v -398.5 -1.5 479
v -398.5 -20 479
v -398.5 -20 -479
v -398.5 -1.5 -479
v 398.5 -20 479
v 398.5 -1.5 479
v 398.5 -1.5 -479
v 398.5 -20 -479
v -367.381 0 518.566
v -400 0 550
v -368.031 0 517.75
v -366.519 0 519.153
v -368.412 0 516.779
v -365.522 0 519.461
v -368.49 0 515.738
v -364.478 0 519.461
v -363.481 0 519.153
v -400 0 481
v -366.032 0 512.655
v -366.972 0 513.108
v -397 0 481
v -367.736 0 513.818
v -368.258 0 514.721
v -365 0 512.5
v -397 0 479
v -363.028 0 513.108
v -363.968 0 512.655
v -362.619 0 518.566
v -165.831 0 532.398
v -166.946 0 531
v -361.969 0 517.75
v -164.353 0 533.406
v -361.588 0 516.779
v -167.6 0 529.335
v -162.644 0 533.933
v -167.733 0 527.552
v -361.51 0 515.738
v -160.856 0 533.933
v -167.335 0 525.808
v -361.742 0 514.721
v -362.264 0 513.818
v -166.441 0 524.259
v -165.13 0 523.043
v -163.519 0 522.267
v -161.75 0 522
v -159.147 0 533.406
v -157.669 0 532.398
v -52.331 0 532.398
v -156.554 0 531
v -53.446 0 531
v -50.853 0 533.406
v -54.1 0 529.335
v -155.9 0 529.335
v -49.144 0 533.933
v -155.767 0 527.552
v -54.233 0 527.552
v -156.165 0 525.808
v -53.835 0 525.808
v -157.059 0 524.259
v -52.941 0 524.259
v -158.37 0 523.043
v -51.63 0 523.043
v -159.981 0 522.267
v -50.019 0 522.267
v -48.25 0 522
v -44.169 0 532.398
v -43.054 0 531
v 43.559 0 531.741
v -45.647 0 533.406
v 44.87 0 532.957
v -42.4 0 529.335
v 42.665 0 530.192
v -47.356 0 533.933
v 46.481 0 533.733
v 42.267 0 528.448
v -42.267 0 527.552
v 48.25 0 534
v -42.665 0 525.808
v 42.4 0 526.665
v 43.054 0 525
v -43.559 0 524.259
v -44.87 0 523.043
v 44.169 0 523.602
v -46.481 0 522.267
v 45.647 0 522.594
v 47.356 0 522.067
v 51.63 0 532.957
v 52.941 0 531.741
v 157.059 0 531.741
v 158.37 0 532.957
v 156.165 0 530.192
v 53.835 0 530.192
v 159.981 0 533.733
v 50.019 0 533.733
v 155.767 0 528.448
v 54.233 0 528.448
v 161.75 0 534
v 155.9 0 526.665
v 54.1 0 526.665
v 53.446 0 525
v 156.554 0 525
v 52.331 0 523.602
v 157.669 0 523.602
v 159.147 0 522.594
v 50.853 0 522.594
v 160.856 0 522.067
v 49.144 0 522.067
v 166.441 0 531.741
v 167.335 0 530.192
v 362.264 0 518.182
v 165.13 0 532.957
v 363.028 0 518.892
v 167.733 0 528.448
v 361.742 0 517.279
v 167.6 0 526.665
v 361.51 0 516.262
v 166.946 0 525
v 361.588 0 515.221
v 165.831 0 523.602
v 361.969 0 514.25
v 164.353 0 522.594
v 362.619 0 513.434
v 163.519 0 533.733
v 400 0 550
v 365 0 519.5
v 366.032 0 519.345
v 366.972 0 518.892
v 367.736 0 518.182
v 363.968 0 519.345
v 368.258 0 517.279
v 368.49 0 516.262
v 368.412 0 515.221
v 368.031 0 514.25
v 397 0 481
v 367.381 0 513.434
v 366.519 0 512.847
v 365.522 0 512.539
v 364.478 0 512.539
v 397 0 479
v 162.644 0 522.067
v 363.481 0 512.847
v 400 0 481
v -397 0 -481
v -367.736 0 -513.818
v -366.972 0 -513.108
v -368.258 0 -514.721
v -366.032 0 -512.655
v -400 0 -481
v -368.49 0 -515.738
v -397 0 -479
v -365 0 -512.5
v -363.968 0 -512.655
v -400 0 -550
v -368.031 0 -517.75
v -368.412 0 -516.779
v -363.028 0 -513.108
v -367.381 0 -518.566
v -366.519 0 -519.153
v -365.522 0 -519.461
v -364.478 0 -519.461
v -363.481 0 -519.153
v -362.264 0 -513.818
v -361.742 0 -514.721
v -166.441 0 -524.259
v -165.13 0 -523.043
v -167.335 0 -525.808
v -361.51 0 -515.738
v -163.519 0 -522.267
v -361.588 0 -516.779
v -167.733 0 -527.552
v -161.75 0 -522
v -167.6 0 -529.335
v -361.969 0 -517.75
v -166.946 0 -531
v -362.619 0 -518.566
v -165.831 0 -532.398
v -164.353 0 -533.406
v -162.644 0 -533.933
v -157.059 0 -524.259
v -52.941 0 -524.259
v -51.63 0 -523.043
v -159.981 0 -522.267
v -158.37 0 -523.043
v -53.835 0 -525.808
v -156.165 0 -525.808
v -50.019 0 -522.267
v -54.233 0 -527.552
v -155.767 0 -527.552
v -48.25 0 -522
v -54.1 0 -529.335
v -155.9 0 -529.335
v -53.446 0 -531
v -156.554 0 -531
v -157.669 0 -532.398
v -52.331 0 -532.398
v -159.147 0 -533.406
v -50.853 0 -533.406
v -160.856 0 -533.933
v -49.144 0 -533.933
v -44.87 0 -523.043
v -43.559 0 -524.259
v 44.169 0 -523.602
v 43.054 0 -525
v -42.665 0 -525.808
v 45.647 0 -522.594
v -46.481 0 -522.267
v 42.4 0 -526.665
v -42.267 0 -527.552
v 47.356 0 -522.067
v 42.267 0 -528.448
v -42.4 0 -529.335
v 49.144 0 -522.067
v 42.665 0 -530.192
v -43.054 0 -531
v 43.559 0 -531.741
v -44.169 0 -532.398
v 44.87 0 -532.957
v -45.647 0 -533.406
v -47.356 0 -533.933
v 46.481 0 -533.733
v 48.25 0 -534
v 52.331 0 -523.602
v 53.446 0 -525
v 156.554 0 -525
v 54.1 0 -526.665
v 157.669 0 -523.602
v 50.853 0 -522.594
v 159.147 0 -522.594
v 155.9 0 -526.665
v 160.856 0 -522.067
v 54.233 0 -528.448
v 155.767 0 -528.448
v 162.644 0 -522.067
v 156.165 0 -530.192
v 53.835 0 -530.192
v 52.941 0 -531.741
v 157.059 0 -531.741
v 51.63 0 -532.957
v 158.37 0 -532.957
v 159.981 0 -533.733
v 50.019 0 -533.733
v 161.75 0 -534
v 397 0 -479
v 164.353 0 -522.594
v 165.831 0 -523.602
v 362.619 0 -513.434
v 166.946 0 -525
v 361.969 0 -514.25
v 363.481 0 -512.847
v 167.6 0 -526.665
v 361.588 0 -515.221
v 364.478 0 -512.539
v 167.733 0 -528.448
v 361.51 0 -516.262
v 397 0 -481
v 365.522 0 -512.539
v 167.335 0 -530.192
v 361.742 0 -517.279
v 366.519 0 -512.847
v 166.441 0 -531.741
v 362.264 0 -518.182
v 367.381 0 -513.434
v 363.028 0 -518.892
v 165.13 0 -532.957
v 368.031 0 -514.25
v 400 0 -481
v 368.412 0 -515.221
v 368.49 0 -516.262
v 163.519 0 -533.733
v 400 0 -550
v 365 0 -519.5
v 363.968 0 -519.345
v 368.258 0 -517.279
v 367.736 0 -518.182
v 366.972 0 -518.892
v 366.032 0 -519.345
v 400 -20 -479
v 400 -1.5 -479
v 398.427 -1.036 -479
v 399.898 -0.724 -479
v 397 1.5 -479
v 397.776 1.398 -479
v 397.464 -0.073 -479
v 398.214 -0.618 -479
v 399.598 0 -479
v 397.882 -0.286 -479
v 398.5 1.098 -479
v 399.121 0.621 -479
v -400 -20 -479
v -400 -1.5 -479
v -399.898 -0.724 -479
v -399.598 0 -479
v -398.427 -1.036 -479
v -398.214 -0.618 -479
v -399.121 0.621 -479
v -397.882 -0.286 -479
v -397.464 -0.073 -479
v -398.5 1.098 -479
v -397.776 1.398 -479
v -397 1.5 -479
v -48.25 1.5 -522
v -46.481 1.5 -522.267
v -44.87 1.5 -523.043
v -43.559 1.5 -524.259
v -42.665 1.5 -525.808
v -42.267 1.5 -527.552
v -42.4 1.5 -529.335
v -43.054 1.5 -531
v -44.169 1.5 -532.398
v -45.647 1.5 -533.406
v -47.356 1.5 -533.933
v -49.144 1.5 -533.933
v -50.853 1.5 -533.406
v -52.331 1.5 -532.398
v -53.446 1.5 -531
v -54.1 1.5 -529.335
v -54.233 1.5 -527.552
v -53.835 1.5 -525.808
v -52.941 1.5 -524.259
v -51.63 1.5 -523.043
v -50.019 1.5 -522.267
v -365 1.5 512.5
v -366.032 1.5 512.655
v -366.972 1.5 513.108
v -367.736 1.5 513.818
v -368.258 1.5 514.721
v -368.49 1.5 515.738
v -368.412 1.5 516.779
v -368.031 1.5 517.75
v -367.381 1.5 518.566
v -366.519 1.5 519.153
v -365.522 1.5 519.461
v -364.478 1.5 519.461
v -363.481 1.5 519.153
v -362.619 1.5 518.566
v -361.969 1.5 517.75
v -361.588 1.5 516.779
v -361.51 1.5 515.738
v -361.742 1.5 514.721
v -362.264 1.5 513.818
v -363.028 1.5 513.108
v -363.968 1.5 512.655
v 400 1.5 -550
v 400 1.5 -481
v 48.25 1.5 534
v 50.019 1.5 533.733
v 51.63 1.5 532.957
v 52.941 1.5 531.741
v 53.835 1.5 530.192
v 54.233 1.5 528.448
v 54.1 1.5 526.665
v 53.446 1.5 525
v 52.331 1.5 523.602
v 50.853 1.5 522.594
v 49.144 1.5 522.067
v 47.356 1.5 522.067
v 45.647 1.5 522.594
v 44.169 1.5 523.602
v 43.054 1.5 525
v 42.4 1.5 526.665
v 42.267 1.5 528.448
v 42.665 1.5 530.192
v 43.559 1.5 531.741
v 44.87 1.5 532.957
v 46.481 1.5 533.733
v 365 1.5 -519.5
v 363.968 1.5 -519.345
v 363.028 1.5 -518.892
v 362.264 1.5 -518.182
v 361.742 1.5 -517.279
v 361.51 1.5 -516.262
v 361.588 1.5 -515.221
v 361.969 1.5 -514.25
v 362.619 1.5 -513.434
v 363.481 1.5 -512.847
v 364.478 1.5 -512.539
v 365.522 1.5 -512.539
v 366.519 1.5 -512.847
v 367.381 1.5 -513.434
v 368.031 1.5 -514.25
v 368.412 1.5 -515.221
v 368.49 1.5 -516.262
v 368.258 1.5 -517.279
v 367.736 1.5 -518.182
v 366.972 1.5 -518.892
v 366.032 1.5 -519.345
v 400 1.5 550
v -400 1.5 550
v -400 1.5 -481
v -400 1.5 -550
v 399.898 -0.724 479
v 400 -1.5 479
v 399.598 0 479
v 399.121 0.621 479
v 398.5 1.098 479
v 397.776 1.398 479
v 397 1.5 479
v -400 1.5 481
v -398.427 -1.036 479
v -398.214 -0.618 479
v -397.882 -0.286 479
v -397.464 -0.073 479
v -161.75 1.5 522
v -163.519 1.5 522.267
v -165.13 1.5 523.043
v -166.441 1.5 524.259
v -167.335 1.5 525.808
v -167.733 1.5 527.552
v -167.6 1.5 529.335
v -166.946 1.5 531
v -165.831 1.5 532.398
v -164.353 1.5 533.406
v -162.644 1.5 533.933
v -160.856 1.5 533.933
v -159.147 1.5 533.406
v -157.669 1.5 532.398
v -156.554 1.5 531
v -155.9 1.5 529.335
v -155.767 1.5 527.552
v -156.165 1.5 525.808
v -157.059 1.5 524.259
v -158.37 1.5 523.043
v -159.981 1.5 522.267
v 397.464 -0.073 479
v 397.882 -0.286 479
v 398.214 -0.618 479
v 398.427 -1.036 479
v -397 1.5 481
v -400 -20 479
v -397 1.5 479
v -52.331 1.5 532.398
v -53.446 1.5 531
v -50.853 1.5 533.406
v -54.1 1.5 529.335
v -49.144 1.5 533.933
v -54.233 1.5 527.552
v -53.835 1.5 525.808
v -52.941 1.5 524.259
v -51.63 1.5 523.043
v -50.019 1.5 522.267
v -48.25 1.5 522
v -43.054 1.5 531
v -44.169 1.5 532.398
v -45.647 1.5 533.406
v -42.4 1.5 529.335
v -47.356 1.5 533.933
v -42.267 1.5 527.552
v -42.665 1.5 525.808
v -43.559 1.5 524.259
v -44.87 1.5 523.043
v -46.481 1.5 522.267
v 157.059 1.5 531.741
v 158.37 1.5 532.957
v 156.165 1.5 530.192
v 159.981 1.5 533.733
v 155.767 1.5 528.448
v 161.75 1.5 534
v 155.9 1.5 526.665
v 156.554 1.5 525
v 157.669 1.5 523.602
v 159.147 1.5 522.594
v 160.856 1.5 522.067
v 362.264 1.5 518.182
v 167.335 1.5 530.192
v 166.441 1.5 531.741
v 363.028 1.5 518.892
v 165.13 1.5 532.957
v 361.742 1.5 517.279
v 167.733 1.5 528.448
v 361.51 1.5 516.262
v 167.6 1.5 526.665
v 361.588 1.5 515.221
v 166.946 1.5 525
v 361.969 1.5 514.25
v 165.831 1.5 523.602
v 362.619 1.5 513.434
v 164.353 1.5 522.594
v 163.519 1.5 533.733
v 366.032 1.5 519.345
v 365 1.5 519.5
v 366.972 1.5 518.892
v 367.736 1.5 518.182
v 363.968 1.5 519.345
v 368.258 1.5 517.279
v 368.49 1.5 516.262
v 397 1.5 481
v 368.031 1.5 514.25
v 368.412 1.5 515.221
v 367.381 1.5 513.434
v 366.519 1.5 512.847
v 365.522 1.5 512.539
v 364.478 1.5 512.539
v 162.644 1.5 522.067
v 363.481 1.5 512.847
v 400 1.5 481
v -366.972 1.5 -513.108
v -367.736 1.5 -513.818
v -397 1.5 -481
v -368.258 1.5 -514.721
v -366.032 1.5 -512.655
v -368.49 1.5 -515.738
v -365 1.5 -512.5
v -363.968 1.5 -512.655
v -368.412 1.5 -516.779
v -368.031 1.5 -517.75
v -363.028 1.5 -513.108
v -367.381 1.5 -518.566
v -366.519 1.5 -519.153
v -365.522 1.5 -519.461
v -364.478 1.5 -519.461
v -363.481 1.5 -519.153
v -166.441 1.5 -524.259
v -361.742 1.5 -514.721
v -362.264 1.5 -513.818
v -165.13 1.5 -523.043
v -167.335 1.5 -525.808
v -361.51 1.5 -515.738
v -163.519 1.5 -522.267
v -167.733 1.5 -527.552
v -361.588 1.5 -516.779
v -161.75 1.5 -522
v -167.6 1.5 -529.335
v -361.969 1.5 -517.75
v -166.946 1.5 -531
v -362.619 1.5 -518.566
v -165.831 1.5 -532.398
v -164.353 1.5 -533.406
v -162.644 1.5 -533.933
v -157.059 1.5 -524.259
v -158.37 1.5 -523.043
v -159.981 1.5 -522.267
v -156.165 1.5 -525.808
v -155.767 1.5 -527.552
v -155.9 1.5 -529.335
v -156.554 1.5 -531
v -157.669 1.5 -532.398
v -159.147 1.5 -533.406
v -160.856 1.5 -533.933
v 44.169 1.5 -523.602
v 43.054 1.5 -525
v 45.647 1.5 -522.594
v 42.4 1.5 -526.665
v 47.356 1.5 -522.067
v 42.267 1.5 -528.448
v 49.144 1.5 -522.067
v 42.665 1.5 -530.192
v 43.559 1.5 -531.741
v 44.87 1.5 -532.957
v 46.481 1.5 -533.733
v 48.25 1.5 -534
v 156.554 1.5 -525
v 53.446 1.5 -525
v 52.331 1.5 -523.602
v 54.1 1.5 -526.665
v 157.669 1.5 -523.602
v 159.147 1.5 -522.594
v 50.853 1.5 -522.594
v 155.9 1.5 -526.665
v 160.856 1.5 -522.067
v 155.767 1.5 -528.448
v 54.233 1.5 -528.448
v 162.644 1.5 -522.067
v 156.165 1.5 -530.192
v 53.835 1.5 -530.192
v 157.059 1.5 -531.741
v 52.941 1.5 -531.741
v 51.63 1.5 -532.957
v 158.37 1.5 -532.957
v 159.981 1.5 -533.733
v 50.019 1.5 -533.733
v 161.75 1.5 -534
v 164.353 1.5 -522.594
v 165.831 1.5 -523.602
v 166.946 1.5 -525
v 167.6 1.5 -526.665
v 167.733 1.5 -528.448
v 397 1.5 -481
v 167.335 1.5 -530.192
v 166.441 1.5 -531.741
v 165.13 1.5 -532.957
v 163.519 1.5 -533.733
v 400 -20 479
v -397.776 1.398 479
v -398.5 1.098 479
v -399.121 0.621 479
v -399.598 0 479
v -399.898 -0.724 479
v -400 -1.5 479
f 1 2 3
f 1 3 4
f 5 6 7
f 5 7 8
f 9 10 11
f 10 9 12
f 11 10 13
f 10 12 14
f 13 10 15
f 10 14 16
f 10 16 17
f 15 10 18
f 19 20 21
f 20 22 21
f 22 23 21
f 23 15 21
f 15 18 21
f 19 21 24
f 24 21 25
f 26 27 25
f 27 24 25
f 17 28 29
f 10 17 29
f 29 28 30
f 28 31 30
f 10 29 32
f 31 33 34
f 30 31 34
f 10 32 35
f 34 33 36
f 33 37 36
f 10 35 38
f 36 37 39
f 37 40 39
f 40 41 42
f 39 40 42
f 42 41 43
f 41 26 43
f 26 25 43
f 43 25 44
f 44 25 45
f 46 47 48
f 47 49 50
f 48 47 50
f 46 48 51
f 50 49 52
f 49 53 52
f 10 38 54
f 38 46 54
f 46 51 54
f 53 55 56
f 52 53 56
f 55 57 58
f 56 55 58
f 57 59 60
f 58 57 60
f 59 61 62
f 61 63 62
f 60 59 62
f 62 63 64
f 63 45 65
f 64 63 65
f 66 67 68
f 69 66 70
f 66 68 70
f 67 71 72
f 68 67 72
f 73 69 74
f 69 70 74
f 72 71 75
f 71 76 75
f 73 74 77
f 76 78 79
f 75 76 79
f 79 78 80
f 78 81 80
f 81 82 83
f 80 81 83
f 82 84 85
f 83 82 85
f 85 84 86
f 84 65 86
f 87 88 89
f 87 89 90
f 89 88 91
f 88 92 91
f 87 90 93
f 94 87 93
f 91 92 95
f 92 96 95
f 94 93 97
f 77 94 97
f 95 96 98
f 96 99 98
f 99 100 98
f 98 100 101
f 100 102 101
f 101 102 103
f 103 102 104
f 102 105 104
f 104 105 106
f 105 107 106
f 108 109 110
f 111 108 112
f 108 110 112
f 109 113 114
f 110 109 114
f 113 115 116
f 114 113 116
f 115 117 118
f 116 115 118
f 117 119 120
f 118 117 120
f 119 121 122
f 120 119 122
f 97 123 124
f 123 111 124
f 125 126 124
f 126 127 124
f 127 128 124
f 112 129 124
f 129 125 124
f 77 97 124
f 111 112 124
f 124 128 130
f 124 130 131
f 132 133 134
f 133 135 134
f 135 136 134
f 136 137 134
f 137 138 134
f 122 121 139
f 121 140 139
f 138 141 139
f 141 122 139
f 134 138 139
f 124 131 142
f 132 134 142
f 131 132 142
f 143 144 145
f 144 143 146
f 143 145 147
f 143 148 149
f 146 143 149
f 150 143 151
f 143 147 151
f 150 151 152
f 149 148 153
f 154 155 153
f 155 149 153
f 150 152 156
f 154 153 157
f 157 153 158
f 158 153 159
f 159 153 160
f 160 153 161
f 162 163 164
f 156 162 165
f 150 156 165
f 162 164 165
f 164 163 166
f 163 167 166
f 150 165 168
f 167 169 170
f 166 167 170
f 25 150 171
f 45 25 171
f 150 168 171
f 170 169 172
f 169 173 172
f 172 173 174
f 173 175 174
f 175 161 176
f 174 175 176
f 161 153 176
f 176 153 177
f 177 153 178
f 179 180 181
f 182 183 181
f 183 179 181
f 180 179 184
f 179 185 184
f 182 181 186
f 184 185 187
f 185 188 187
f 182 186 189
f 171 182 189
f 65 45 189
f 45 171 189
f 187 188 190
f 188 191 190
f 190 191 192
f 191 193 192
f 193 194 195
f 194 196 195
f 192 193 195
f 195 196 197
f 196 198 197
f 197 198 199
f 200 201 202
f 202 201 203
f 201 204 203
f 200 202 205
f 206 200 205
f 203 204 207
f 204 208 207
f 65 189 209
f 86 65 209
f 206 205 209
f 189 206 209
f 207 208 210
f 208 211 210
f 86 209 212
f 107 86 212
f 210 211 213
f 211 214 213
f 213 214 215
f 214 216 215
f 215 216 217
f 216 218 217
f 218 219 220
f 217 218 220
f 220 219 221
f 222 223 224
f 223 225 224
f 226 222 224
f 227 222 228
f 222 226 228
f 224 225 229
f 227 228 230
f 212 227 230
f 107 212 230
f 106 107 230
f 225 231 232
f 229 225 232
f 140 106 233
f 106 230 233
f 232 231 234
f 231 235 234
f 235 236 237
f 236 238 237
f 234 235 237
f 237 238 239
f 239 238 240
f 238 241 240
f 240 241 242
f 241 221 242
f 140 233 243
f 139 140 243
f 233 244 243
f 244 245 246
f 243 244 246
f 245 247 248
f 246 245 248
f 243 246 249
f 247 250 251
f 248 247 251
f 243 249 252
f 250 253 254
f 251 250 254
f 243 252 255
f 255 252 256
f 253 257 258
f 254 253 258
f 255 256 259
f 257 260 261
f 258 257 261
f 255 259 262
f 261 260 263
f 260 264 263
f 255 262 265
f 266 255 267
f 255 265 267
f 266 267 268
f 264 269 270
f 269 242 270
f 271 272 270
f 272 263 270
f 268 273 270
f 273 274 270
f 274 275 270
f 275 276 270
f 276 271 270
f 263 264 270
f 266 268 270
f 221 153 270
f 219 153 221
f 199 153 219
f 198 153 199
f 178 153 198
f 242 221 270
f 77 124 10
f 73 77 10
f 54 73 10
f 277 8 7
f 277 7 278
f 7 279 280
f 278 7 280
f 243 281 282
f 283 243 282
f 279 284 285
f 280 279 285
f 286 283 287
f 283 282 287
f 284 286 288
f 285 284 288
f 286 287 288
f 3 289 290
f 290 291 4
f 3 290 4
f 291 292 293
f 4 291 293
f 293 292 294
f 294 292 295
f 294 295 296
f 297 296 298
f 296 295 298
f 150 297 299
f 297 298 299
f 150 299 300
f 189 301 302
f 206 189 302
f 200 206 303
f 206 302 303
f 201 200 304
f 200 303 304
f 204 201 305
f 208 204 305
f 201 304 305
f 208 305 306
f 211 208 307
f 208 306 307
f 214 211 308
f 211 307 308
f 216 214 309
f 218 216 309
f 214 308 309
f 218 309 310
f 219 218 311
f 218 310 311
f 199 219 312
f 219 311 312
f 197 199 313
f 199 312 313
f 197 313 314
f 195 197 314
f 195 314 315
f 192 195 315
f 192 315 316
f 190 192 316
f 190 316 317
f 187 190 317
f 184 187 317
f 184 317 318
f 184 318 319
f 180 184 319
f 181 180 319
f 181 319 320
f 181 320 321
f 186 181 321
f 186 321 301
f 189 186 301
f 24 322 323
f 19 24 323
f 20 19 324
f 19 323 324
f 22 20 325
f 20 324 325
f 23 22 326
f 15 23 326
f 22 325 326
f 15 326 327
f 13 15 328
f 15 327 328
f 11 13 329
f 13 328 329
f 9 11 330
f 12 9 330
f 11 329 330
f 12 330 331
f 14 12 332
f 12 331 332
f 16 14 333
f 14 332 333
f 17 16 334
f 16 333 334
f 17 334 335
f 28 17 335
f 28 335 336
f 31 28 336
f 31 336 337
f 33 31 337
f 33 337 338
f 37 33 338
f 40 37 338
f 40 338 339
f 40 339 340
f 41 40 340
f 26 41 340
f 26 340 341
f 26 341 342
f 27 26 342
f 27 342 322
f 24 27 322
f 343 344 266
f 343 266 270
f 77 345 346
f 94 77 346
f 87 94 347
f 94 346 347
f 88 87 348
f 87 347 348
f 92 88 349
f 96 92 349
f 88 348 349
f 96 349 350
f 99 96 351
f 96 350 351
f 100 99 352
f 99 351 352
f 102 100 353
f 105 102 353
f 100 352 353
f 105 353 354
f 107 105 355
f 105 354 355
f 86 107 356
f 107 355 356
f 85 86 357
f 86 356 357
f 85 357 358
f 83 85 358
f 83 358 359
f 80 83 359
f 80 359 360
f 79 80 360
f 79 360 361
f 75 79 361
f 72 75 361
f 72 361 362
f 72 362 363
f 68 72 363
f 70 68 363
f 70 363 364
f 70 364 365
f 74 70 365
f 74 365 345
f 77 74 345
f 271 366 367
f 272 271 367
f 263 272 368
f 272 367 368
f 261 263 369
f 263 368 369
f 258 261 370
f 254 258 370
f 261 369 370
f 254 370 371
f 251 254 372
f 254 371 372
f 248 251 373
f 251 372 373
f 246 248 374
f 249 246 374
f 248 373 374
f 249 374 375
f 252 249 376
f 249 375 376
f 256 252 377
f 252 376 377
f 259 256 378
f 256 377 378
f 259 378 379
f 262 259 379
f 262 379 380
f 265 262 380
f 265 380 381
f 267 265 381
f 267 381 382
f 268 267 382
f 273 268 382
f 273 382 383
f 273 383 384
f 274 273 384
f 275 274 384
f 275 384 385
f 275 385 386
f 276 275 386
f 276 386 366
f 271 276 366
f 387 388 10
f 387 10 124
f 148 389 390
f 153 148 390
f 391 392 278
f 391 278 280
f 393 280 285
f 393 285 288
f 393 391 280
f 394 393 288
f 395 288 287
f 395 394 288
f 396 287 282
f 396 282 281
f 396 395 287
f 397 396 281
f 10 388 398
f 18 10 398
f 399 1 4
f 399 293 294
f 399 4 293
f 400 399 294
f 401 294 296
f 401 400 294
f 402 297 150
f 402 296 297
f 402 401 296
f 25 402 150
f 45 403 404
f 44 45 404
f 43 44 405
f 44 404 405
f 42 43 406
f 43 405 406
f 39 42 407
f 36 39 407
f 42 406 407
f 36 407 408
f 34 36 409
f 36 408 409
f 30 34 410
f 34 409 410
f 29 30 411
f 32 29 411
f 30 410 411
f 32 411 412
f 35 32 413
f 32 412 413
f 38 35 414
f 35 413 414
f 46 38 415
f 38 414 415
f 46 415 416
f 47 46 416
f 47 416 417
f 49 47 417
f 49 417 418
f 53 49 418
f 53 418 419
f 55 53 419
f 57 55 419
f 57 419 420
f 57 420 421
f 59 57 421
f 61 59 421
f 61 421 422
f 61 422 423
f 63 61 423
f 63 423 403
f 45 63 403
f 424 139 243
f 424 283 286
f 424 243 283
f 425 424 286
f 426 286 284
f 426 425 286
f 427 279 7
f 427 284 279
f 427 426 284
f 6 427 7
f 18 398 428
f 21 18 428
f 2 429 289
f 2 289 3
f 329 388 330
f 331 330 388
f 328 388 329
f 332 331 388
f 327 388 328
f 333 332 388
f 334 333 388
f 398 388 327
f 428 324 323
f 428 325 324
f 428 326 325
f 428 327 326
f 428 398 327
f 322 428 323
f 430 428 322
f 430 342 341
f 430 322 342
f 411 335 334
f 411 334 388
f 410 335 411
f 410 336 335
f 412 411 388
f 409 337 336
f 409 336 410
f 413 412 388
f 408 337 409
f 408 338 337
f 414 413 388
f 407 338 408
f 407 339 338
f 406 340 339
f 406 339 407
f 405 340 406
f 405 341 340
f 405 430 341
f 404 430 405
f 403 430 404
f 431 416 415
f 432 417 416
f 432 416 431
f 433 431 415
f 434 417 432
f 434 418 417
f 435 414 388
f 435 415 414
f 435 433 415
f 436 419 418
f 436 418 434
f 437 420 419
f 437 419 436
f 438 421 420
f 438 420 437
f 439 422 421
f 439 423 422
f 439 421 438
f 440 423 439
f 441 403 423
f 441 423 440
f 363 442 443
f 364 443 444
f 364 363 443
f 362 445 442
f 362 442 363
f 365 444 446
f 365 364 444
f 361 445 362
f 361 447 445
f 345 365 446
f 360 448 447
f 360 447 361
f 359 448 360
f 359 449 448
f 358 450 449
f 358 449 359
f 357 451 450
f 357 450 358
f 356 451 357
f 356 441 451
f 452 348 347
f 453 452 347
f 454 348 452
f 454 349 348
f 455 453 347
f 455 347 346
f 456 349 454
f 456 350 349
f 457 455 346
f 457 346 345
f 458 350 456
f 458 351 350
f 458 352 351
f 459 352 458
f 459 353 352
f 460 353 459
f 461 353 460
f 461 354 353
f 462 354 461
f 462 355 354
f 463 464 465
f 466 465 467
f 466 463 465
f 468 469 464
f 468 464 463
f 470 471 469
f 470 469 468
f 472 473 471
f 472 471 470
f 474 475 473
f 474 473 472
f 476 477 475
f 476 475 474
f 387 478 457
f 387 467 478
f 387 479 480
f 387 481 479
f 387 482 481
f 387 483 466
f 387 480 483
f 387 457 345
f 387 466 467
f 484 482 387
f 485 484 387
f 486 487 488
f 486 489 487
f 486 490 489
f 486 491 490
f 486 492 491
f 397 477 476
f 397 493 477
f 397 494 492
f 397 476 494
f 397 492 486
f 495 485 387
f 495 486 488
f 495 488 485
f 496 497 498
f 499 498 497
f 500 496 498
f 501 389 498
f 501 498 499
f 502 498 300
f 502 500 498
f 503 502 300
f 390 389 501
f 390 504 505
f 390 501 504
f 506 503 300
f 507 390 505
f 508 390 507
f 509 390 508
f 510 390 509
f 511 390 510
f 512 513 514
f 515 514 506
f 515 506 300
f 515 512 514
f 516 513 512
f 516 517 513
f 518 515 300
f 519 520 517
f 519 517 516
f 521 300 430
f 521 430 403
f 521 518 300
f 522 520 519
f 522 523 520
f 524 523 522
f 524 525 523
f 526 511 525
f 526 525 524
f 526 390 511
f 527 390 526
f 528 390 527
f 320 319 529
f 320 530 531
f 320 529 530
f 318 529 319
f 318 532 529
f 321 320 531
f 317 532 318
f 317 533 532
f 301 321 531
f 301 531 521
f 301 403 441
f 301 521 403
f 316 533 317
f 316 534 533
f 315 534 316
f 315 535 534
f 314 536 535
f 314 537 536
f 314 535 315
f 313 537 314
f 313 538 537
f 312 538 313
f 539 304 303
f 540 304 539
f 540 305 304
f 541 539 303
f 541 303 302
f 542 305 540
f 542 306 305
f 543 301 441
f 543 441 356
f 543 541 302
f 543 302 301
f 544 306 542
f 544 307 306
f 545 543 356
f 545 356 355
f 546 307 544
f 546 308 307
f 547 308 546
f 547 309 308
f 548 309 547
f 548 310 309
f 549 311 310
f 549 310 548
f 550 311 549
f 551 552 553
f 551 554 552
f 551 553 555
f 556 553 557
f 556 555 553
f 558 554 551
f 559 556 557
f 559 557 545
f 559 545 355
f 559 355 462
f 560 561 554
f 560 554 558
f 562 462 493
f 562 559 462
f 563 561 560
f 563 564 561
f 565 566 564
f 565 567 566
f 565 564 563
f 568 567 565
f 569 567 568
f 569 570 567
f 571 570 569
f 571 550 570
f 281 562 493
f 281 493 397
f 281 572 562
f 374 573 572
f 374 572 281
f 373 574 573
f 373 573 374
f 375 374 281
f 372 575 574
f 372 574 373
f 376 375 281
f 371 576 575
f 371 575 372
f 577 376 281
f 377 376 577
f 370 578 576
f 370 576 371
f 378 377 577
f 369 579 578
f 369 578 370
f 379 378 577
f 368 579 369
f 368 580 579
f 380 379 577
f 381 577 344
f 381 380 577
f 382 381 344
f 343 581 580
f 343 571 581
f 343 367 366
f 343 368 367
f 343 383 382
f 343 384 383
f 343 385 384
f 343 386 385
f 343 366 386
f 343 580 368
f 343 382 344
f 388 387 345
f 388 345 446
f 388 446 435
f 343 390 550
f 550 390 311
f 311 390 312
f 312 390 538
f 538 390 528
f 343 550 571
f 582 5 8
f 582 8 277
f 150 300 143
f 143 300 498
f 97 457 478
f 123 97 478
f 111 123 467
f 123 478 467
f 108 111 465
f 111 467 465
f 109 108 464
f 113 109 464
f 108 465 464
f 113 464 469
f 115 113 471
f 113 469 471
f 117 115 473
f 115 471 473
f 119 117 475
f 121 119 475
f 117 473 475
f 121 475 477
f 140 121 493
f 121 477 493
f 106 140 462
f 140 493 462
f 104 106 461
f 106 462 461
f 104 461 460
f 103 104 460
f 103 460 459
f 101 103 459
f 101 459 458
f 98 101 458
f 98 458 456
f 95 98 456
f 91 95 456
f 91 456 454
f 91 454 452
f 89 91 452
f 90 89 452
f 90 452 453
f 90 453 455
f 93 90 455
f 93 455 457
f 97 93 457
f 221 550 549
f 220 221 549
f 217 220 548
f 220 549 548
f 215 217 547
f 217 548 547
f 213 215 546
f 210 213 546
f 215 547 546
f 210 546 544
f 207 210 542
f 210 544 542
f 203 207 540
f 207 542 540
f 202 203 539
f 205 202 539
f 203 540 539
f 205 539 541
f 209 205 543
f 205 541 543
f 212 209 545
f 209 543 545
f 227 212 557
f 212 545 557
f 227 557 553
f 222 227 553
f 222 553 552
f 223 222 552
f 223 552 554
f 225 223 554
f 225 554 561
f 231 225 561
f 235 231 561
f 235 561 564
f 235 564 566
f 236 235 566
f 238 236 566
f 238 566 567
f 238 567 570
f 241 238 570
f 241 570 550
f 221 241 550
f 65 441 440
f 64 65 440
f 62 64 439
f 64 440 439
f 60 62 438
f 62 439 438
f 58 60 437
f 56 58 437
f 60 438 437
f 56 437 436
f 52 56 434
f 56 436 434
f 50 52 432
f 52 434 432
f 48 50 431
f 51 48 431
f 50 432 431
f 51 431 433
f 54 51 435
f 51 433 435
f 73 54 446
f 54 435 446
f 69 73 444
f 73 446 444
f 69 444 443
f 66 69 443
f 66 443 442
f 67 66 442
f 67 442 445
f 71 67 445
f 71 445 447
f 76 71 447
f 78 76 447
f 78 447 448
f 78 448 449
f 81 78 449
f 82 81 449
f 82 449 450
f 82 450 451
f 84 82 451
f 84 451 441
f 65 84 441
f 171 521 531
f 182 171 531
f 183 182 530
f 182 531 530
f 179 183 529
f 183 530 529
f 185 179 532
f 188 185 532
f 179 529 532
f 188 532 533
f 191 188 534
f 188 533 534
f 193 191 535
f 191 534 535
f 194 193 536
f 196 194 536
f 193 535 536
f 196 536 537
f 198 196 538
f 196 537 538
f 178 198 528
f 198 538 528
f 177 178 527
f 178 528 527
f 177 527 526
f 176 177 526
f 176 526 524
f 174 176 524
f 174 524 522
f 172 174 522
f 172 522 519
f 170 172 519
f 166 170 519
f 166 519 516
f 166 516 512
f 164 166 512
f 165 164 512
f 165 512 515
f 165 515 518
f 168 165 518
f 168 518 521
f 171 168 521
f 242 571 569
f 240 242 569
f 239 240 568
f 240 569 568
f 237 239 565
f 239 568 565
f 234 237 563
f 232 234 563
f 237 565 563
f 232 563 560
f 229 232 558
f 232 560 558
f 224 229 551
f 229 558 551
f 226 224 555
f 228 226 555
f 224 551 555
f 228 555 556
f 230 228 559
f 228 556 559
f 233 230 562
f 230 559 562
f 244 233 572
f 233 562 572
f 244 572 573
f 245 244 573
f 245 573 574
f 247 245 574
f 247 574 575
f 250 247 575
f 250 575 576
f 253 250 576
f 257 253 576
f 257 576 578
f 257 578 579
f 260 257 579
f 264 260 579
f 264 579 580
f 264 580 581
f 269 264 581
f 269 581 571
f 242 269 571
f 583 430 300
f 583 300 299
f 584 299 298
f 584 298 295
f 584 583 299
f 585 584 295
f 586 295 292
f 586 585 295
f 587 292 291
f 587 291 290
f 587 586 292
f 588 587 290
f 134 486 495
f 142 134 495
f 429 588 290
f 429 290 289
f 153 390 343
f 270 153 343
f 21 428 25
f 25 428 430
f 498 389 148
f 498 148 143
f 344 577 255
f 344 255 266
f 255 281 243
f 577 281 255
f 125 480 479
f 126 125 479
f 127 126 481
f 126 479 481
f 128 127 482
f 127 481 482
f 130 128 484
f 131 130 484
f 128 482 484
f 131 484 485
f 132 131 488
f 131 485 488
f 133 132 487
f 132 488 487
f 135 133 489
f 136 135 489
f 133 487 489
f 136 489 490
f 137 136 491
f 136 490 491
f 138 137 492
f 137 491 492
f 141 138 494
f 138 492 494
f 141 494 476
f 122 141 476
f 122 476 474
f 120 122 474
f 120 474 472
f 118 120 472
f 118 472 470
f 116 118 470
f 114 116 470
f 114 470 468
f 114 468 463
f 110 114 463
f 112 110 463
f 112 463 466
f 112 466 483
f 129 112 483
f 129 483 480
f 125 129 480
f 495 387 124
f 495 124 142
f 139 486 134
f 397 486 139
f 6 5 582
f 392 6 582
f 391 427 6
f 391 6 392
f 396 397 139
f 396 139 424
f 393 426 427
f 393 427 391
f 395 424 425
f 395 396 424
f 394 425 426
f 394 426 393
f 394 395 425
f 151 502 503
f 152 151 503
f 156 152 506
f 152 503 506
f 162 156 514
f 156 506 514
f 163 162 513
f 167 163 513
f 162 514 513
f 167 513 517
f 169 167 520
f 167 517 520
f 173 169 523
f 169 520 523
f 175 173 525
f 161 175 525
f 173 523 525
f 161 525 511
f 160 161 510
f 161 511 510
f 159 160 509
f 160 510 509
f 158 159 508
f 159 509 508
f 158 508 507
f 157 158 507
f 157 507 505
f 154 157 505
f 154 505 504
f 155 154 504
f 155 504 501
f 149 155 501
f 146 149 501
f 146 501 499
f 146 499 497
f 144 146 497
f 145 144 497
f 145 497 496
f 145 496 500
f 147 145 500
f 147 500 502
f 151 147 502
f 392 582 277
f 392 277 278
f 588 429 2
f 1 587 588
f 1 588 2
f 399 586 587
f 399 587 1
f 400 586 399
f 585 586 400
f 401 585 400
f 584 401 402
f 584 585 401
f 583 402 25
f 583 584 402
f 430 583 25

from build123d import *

# Parameters (mm, degrees)
SM_BASE_FLANGE_1_DEPTH   = 550
SKETCH_6_W               = 3
SKETCH_6_H               = 71
CUT_EXTRUDE_1_DEPTH      = 681.413293521
SKETCH_7_W               = 3
SKETCH_7_H               = 69
SM_BASE_FLANGE_1_2_DEPTH = 1.5
SKETCH_10_R              = 3.5
CUT_EXTRUDE_2_DEPTH      = 10
SKETCH_11_R              = 6
CUT_EXTRUDE_1853_DEPTH   = 10


# Sheet-metal steps are written as plain solids
with BuildPart() as part:
    # Sketch 1 → Sm Base Flange 1 (new, symmetric)
    with BuildSketch(Plane.XY):
        with BuildLine():
            Line((-398.5, -20), (-398.5, -1.5))
            ThreePointArc((-398.5, -1.5), (-398.060660172, -0.439339828), (-397, 0))
            Line((-397, 0), (397, 0))
            ThreePointArc((397, 0), (398.060660172, -0.439339828), (398.5, -1.5))
            Line((398.5, -1.5), (398.5, -20))
            Line((398.5, -20), (400, -20))
            Line((400, -20), (400, -1.5))
            ThreePointArc((400, -1.5), (399.121320344, 0.621320344), (397, 1.5))
            Line((397, 1.5), (-397, 1.5))
            ThreePointArc((-397, 1.5), (-399.121320344, 0.621320344), (-400, -1.5))
            Line((-400, -1.5), (-400, -20))
            Line((-400, -20), (-398.5, -20))
        make_face()
    extrude(amount=SM_BASE_FLANGE_1_DEPTH, both=True)

    # Эскиз6 → Вырез-Вытянуть1 (cut, through all)
    with BuildSketch(Plane(origin=(0, 1.5, 0), x_dir=(1, 0, 0), z_dir=(0, 1, 0))):
        with Locations((398.5, -514.5)):
            Rectangle(SKETCH_6_W, SKETCH_6_H)
        with Locations((398.5, 514.5)):
            Rectangle(SKETCH_6_W, SKETCH_6_H)
        with Locations((-398.5, 514.5)):
            Rectangle(SKETCH_6_W, SKETCH_6_H)
        with Locations((-398.5, -514.5)):
            Rectangle(SKETCH_6_W, SKETCH_6_H)
    extrude(amount=-CUT_EXTRUDE_1_DEPTH, mode=Mode.SUBTRACT)

    # Эскиз7 → Sm Base Flange 1 2 (add)
    with BuildSketch(Plane(origin=(0, 1.5, 0), x_dir=(1, 0, 0), z_dir=(0, 1, 0))):
        with Locations((398.5, -515.5)):
            Rectangle(SKETCH_7_W, SKETCH_7_H)
        with Locations((398.5, 515.5)):
            Rectangle(SKETCH_7_W, SKETCH_7_H)
        with Locations((-398.5, 515.5)):
            Rectangle(SKETCH_7_W, SKETCH_7_H)
        with Locations((-398.5, -515.5)):
            Rectangle(SKETCH_7_W, SKETCH_7_H)
    extrude(amount=-SM_BASE_FLANGE_1_2_DEPTH)

    # Эскиз10 → Вырез-Вытянуть2 (cut)
    with BuildSketch(Plane(origin=(0, 1.5, 0), x_dir=(1, 0, 0), z_dir=(0, 1, 0))):
        with Locations(Location((365, -516, 0), (0, 0, 270))):
            Circle(SKETCH_10_R)
        with Locations(Location((365, 516, 0), (0, 0, 90))):
            Circle(SKETCH_10_R)
        with Locations(Location((-365, 516, 0), (0, 0, 270))):
            Circle(SKETCH_10_R)
        with Locations(Location((-365, -516, 0), (0, 0, 90))):
            Circle(SKETCH_10_R)
    extrude(amount=-CUT_EXTRUDE_2_DEPTH, mode=Mode.SUBTRACT)

    # Эскиз11 → Cut-Extrude 1853 (cut)
    with BuildSketch(Plane(origin=(0, 1.5, 0), x_dir=(1, 0, 0), z_dir=(0, 1, 0))):
        with Locations(Location((161.75, -528, 0), (0, 0, 270))):
            Circle(SKETCH_11_R)
        with Locations(Location((48.25, -528, 0), (0, 0, 270))):
            Circle(SKETCH_11_R)
        with Locations(Location((48.25, 528, 0), (0, 0, 90))):
            Circle(SKETCH_11_R)
        with Locations(Location((161.75, 528, 0), (0, 0, 90))):
            Circle(SKETCH_11_R)
        with Locations(Location((-161.75, 528, 0), (0, 0, 270))):
            Circle(SKETCH_11_R)
        with Locations(Location((-48.25, 528, 0), (0, 0, 270))):
            Circle(SKETCH_11_R)
        with Locations(Location((-48.25, -528, 0), (0, 0, 90))):
            Circle(SKETCH_11_R)
        with Locations(Location((-161.75, -528, 0), (0, 0, 90))):
            Circle(SKETCH_11_R)
    extrude(amount=-CUT_EXTRUDE_1853_DEPTH, mode=Mode.SUBTRACT)


solid = part.part
